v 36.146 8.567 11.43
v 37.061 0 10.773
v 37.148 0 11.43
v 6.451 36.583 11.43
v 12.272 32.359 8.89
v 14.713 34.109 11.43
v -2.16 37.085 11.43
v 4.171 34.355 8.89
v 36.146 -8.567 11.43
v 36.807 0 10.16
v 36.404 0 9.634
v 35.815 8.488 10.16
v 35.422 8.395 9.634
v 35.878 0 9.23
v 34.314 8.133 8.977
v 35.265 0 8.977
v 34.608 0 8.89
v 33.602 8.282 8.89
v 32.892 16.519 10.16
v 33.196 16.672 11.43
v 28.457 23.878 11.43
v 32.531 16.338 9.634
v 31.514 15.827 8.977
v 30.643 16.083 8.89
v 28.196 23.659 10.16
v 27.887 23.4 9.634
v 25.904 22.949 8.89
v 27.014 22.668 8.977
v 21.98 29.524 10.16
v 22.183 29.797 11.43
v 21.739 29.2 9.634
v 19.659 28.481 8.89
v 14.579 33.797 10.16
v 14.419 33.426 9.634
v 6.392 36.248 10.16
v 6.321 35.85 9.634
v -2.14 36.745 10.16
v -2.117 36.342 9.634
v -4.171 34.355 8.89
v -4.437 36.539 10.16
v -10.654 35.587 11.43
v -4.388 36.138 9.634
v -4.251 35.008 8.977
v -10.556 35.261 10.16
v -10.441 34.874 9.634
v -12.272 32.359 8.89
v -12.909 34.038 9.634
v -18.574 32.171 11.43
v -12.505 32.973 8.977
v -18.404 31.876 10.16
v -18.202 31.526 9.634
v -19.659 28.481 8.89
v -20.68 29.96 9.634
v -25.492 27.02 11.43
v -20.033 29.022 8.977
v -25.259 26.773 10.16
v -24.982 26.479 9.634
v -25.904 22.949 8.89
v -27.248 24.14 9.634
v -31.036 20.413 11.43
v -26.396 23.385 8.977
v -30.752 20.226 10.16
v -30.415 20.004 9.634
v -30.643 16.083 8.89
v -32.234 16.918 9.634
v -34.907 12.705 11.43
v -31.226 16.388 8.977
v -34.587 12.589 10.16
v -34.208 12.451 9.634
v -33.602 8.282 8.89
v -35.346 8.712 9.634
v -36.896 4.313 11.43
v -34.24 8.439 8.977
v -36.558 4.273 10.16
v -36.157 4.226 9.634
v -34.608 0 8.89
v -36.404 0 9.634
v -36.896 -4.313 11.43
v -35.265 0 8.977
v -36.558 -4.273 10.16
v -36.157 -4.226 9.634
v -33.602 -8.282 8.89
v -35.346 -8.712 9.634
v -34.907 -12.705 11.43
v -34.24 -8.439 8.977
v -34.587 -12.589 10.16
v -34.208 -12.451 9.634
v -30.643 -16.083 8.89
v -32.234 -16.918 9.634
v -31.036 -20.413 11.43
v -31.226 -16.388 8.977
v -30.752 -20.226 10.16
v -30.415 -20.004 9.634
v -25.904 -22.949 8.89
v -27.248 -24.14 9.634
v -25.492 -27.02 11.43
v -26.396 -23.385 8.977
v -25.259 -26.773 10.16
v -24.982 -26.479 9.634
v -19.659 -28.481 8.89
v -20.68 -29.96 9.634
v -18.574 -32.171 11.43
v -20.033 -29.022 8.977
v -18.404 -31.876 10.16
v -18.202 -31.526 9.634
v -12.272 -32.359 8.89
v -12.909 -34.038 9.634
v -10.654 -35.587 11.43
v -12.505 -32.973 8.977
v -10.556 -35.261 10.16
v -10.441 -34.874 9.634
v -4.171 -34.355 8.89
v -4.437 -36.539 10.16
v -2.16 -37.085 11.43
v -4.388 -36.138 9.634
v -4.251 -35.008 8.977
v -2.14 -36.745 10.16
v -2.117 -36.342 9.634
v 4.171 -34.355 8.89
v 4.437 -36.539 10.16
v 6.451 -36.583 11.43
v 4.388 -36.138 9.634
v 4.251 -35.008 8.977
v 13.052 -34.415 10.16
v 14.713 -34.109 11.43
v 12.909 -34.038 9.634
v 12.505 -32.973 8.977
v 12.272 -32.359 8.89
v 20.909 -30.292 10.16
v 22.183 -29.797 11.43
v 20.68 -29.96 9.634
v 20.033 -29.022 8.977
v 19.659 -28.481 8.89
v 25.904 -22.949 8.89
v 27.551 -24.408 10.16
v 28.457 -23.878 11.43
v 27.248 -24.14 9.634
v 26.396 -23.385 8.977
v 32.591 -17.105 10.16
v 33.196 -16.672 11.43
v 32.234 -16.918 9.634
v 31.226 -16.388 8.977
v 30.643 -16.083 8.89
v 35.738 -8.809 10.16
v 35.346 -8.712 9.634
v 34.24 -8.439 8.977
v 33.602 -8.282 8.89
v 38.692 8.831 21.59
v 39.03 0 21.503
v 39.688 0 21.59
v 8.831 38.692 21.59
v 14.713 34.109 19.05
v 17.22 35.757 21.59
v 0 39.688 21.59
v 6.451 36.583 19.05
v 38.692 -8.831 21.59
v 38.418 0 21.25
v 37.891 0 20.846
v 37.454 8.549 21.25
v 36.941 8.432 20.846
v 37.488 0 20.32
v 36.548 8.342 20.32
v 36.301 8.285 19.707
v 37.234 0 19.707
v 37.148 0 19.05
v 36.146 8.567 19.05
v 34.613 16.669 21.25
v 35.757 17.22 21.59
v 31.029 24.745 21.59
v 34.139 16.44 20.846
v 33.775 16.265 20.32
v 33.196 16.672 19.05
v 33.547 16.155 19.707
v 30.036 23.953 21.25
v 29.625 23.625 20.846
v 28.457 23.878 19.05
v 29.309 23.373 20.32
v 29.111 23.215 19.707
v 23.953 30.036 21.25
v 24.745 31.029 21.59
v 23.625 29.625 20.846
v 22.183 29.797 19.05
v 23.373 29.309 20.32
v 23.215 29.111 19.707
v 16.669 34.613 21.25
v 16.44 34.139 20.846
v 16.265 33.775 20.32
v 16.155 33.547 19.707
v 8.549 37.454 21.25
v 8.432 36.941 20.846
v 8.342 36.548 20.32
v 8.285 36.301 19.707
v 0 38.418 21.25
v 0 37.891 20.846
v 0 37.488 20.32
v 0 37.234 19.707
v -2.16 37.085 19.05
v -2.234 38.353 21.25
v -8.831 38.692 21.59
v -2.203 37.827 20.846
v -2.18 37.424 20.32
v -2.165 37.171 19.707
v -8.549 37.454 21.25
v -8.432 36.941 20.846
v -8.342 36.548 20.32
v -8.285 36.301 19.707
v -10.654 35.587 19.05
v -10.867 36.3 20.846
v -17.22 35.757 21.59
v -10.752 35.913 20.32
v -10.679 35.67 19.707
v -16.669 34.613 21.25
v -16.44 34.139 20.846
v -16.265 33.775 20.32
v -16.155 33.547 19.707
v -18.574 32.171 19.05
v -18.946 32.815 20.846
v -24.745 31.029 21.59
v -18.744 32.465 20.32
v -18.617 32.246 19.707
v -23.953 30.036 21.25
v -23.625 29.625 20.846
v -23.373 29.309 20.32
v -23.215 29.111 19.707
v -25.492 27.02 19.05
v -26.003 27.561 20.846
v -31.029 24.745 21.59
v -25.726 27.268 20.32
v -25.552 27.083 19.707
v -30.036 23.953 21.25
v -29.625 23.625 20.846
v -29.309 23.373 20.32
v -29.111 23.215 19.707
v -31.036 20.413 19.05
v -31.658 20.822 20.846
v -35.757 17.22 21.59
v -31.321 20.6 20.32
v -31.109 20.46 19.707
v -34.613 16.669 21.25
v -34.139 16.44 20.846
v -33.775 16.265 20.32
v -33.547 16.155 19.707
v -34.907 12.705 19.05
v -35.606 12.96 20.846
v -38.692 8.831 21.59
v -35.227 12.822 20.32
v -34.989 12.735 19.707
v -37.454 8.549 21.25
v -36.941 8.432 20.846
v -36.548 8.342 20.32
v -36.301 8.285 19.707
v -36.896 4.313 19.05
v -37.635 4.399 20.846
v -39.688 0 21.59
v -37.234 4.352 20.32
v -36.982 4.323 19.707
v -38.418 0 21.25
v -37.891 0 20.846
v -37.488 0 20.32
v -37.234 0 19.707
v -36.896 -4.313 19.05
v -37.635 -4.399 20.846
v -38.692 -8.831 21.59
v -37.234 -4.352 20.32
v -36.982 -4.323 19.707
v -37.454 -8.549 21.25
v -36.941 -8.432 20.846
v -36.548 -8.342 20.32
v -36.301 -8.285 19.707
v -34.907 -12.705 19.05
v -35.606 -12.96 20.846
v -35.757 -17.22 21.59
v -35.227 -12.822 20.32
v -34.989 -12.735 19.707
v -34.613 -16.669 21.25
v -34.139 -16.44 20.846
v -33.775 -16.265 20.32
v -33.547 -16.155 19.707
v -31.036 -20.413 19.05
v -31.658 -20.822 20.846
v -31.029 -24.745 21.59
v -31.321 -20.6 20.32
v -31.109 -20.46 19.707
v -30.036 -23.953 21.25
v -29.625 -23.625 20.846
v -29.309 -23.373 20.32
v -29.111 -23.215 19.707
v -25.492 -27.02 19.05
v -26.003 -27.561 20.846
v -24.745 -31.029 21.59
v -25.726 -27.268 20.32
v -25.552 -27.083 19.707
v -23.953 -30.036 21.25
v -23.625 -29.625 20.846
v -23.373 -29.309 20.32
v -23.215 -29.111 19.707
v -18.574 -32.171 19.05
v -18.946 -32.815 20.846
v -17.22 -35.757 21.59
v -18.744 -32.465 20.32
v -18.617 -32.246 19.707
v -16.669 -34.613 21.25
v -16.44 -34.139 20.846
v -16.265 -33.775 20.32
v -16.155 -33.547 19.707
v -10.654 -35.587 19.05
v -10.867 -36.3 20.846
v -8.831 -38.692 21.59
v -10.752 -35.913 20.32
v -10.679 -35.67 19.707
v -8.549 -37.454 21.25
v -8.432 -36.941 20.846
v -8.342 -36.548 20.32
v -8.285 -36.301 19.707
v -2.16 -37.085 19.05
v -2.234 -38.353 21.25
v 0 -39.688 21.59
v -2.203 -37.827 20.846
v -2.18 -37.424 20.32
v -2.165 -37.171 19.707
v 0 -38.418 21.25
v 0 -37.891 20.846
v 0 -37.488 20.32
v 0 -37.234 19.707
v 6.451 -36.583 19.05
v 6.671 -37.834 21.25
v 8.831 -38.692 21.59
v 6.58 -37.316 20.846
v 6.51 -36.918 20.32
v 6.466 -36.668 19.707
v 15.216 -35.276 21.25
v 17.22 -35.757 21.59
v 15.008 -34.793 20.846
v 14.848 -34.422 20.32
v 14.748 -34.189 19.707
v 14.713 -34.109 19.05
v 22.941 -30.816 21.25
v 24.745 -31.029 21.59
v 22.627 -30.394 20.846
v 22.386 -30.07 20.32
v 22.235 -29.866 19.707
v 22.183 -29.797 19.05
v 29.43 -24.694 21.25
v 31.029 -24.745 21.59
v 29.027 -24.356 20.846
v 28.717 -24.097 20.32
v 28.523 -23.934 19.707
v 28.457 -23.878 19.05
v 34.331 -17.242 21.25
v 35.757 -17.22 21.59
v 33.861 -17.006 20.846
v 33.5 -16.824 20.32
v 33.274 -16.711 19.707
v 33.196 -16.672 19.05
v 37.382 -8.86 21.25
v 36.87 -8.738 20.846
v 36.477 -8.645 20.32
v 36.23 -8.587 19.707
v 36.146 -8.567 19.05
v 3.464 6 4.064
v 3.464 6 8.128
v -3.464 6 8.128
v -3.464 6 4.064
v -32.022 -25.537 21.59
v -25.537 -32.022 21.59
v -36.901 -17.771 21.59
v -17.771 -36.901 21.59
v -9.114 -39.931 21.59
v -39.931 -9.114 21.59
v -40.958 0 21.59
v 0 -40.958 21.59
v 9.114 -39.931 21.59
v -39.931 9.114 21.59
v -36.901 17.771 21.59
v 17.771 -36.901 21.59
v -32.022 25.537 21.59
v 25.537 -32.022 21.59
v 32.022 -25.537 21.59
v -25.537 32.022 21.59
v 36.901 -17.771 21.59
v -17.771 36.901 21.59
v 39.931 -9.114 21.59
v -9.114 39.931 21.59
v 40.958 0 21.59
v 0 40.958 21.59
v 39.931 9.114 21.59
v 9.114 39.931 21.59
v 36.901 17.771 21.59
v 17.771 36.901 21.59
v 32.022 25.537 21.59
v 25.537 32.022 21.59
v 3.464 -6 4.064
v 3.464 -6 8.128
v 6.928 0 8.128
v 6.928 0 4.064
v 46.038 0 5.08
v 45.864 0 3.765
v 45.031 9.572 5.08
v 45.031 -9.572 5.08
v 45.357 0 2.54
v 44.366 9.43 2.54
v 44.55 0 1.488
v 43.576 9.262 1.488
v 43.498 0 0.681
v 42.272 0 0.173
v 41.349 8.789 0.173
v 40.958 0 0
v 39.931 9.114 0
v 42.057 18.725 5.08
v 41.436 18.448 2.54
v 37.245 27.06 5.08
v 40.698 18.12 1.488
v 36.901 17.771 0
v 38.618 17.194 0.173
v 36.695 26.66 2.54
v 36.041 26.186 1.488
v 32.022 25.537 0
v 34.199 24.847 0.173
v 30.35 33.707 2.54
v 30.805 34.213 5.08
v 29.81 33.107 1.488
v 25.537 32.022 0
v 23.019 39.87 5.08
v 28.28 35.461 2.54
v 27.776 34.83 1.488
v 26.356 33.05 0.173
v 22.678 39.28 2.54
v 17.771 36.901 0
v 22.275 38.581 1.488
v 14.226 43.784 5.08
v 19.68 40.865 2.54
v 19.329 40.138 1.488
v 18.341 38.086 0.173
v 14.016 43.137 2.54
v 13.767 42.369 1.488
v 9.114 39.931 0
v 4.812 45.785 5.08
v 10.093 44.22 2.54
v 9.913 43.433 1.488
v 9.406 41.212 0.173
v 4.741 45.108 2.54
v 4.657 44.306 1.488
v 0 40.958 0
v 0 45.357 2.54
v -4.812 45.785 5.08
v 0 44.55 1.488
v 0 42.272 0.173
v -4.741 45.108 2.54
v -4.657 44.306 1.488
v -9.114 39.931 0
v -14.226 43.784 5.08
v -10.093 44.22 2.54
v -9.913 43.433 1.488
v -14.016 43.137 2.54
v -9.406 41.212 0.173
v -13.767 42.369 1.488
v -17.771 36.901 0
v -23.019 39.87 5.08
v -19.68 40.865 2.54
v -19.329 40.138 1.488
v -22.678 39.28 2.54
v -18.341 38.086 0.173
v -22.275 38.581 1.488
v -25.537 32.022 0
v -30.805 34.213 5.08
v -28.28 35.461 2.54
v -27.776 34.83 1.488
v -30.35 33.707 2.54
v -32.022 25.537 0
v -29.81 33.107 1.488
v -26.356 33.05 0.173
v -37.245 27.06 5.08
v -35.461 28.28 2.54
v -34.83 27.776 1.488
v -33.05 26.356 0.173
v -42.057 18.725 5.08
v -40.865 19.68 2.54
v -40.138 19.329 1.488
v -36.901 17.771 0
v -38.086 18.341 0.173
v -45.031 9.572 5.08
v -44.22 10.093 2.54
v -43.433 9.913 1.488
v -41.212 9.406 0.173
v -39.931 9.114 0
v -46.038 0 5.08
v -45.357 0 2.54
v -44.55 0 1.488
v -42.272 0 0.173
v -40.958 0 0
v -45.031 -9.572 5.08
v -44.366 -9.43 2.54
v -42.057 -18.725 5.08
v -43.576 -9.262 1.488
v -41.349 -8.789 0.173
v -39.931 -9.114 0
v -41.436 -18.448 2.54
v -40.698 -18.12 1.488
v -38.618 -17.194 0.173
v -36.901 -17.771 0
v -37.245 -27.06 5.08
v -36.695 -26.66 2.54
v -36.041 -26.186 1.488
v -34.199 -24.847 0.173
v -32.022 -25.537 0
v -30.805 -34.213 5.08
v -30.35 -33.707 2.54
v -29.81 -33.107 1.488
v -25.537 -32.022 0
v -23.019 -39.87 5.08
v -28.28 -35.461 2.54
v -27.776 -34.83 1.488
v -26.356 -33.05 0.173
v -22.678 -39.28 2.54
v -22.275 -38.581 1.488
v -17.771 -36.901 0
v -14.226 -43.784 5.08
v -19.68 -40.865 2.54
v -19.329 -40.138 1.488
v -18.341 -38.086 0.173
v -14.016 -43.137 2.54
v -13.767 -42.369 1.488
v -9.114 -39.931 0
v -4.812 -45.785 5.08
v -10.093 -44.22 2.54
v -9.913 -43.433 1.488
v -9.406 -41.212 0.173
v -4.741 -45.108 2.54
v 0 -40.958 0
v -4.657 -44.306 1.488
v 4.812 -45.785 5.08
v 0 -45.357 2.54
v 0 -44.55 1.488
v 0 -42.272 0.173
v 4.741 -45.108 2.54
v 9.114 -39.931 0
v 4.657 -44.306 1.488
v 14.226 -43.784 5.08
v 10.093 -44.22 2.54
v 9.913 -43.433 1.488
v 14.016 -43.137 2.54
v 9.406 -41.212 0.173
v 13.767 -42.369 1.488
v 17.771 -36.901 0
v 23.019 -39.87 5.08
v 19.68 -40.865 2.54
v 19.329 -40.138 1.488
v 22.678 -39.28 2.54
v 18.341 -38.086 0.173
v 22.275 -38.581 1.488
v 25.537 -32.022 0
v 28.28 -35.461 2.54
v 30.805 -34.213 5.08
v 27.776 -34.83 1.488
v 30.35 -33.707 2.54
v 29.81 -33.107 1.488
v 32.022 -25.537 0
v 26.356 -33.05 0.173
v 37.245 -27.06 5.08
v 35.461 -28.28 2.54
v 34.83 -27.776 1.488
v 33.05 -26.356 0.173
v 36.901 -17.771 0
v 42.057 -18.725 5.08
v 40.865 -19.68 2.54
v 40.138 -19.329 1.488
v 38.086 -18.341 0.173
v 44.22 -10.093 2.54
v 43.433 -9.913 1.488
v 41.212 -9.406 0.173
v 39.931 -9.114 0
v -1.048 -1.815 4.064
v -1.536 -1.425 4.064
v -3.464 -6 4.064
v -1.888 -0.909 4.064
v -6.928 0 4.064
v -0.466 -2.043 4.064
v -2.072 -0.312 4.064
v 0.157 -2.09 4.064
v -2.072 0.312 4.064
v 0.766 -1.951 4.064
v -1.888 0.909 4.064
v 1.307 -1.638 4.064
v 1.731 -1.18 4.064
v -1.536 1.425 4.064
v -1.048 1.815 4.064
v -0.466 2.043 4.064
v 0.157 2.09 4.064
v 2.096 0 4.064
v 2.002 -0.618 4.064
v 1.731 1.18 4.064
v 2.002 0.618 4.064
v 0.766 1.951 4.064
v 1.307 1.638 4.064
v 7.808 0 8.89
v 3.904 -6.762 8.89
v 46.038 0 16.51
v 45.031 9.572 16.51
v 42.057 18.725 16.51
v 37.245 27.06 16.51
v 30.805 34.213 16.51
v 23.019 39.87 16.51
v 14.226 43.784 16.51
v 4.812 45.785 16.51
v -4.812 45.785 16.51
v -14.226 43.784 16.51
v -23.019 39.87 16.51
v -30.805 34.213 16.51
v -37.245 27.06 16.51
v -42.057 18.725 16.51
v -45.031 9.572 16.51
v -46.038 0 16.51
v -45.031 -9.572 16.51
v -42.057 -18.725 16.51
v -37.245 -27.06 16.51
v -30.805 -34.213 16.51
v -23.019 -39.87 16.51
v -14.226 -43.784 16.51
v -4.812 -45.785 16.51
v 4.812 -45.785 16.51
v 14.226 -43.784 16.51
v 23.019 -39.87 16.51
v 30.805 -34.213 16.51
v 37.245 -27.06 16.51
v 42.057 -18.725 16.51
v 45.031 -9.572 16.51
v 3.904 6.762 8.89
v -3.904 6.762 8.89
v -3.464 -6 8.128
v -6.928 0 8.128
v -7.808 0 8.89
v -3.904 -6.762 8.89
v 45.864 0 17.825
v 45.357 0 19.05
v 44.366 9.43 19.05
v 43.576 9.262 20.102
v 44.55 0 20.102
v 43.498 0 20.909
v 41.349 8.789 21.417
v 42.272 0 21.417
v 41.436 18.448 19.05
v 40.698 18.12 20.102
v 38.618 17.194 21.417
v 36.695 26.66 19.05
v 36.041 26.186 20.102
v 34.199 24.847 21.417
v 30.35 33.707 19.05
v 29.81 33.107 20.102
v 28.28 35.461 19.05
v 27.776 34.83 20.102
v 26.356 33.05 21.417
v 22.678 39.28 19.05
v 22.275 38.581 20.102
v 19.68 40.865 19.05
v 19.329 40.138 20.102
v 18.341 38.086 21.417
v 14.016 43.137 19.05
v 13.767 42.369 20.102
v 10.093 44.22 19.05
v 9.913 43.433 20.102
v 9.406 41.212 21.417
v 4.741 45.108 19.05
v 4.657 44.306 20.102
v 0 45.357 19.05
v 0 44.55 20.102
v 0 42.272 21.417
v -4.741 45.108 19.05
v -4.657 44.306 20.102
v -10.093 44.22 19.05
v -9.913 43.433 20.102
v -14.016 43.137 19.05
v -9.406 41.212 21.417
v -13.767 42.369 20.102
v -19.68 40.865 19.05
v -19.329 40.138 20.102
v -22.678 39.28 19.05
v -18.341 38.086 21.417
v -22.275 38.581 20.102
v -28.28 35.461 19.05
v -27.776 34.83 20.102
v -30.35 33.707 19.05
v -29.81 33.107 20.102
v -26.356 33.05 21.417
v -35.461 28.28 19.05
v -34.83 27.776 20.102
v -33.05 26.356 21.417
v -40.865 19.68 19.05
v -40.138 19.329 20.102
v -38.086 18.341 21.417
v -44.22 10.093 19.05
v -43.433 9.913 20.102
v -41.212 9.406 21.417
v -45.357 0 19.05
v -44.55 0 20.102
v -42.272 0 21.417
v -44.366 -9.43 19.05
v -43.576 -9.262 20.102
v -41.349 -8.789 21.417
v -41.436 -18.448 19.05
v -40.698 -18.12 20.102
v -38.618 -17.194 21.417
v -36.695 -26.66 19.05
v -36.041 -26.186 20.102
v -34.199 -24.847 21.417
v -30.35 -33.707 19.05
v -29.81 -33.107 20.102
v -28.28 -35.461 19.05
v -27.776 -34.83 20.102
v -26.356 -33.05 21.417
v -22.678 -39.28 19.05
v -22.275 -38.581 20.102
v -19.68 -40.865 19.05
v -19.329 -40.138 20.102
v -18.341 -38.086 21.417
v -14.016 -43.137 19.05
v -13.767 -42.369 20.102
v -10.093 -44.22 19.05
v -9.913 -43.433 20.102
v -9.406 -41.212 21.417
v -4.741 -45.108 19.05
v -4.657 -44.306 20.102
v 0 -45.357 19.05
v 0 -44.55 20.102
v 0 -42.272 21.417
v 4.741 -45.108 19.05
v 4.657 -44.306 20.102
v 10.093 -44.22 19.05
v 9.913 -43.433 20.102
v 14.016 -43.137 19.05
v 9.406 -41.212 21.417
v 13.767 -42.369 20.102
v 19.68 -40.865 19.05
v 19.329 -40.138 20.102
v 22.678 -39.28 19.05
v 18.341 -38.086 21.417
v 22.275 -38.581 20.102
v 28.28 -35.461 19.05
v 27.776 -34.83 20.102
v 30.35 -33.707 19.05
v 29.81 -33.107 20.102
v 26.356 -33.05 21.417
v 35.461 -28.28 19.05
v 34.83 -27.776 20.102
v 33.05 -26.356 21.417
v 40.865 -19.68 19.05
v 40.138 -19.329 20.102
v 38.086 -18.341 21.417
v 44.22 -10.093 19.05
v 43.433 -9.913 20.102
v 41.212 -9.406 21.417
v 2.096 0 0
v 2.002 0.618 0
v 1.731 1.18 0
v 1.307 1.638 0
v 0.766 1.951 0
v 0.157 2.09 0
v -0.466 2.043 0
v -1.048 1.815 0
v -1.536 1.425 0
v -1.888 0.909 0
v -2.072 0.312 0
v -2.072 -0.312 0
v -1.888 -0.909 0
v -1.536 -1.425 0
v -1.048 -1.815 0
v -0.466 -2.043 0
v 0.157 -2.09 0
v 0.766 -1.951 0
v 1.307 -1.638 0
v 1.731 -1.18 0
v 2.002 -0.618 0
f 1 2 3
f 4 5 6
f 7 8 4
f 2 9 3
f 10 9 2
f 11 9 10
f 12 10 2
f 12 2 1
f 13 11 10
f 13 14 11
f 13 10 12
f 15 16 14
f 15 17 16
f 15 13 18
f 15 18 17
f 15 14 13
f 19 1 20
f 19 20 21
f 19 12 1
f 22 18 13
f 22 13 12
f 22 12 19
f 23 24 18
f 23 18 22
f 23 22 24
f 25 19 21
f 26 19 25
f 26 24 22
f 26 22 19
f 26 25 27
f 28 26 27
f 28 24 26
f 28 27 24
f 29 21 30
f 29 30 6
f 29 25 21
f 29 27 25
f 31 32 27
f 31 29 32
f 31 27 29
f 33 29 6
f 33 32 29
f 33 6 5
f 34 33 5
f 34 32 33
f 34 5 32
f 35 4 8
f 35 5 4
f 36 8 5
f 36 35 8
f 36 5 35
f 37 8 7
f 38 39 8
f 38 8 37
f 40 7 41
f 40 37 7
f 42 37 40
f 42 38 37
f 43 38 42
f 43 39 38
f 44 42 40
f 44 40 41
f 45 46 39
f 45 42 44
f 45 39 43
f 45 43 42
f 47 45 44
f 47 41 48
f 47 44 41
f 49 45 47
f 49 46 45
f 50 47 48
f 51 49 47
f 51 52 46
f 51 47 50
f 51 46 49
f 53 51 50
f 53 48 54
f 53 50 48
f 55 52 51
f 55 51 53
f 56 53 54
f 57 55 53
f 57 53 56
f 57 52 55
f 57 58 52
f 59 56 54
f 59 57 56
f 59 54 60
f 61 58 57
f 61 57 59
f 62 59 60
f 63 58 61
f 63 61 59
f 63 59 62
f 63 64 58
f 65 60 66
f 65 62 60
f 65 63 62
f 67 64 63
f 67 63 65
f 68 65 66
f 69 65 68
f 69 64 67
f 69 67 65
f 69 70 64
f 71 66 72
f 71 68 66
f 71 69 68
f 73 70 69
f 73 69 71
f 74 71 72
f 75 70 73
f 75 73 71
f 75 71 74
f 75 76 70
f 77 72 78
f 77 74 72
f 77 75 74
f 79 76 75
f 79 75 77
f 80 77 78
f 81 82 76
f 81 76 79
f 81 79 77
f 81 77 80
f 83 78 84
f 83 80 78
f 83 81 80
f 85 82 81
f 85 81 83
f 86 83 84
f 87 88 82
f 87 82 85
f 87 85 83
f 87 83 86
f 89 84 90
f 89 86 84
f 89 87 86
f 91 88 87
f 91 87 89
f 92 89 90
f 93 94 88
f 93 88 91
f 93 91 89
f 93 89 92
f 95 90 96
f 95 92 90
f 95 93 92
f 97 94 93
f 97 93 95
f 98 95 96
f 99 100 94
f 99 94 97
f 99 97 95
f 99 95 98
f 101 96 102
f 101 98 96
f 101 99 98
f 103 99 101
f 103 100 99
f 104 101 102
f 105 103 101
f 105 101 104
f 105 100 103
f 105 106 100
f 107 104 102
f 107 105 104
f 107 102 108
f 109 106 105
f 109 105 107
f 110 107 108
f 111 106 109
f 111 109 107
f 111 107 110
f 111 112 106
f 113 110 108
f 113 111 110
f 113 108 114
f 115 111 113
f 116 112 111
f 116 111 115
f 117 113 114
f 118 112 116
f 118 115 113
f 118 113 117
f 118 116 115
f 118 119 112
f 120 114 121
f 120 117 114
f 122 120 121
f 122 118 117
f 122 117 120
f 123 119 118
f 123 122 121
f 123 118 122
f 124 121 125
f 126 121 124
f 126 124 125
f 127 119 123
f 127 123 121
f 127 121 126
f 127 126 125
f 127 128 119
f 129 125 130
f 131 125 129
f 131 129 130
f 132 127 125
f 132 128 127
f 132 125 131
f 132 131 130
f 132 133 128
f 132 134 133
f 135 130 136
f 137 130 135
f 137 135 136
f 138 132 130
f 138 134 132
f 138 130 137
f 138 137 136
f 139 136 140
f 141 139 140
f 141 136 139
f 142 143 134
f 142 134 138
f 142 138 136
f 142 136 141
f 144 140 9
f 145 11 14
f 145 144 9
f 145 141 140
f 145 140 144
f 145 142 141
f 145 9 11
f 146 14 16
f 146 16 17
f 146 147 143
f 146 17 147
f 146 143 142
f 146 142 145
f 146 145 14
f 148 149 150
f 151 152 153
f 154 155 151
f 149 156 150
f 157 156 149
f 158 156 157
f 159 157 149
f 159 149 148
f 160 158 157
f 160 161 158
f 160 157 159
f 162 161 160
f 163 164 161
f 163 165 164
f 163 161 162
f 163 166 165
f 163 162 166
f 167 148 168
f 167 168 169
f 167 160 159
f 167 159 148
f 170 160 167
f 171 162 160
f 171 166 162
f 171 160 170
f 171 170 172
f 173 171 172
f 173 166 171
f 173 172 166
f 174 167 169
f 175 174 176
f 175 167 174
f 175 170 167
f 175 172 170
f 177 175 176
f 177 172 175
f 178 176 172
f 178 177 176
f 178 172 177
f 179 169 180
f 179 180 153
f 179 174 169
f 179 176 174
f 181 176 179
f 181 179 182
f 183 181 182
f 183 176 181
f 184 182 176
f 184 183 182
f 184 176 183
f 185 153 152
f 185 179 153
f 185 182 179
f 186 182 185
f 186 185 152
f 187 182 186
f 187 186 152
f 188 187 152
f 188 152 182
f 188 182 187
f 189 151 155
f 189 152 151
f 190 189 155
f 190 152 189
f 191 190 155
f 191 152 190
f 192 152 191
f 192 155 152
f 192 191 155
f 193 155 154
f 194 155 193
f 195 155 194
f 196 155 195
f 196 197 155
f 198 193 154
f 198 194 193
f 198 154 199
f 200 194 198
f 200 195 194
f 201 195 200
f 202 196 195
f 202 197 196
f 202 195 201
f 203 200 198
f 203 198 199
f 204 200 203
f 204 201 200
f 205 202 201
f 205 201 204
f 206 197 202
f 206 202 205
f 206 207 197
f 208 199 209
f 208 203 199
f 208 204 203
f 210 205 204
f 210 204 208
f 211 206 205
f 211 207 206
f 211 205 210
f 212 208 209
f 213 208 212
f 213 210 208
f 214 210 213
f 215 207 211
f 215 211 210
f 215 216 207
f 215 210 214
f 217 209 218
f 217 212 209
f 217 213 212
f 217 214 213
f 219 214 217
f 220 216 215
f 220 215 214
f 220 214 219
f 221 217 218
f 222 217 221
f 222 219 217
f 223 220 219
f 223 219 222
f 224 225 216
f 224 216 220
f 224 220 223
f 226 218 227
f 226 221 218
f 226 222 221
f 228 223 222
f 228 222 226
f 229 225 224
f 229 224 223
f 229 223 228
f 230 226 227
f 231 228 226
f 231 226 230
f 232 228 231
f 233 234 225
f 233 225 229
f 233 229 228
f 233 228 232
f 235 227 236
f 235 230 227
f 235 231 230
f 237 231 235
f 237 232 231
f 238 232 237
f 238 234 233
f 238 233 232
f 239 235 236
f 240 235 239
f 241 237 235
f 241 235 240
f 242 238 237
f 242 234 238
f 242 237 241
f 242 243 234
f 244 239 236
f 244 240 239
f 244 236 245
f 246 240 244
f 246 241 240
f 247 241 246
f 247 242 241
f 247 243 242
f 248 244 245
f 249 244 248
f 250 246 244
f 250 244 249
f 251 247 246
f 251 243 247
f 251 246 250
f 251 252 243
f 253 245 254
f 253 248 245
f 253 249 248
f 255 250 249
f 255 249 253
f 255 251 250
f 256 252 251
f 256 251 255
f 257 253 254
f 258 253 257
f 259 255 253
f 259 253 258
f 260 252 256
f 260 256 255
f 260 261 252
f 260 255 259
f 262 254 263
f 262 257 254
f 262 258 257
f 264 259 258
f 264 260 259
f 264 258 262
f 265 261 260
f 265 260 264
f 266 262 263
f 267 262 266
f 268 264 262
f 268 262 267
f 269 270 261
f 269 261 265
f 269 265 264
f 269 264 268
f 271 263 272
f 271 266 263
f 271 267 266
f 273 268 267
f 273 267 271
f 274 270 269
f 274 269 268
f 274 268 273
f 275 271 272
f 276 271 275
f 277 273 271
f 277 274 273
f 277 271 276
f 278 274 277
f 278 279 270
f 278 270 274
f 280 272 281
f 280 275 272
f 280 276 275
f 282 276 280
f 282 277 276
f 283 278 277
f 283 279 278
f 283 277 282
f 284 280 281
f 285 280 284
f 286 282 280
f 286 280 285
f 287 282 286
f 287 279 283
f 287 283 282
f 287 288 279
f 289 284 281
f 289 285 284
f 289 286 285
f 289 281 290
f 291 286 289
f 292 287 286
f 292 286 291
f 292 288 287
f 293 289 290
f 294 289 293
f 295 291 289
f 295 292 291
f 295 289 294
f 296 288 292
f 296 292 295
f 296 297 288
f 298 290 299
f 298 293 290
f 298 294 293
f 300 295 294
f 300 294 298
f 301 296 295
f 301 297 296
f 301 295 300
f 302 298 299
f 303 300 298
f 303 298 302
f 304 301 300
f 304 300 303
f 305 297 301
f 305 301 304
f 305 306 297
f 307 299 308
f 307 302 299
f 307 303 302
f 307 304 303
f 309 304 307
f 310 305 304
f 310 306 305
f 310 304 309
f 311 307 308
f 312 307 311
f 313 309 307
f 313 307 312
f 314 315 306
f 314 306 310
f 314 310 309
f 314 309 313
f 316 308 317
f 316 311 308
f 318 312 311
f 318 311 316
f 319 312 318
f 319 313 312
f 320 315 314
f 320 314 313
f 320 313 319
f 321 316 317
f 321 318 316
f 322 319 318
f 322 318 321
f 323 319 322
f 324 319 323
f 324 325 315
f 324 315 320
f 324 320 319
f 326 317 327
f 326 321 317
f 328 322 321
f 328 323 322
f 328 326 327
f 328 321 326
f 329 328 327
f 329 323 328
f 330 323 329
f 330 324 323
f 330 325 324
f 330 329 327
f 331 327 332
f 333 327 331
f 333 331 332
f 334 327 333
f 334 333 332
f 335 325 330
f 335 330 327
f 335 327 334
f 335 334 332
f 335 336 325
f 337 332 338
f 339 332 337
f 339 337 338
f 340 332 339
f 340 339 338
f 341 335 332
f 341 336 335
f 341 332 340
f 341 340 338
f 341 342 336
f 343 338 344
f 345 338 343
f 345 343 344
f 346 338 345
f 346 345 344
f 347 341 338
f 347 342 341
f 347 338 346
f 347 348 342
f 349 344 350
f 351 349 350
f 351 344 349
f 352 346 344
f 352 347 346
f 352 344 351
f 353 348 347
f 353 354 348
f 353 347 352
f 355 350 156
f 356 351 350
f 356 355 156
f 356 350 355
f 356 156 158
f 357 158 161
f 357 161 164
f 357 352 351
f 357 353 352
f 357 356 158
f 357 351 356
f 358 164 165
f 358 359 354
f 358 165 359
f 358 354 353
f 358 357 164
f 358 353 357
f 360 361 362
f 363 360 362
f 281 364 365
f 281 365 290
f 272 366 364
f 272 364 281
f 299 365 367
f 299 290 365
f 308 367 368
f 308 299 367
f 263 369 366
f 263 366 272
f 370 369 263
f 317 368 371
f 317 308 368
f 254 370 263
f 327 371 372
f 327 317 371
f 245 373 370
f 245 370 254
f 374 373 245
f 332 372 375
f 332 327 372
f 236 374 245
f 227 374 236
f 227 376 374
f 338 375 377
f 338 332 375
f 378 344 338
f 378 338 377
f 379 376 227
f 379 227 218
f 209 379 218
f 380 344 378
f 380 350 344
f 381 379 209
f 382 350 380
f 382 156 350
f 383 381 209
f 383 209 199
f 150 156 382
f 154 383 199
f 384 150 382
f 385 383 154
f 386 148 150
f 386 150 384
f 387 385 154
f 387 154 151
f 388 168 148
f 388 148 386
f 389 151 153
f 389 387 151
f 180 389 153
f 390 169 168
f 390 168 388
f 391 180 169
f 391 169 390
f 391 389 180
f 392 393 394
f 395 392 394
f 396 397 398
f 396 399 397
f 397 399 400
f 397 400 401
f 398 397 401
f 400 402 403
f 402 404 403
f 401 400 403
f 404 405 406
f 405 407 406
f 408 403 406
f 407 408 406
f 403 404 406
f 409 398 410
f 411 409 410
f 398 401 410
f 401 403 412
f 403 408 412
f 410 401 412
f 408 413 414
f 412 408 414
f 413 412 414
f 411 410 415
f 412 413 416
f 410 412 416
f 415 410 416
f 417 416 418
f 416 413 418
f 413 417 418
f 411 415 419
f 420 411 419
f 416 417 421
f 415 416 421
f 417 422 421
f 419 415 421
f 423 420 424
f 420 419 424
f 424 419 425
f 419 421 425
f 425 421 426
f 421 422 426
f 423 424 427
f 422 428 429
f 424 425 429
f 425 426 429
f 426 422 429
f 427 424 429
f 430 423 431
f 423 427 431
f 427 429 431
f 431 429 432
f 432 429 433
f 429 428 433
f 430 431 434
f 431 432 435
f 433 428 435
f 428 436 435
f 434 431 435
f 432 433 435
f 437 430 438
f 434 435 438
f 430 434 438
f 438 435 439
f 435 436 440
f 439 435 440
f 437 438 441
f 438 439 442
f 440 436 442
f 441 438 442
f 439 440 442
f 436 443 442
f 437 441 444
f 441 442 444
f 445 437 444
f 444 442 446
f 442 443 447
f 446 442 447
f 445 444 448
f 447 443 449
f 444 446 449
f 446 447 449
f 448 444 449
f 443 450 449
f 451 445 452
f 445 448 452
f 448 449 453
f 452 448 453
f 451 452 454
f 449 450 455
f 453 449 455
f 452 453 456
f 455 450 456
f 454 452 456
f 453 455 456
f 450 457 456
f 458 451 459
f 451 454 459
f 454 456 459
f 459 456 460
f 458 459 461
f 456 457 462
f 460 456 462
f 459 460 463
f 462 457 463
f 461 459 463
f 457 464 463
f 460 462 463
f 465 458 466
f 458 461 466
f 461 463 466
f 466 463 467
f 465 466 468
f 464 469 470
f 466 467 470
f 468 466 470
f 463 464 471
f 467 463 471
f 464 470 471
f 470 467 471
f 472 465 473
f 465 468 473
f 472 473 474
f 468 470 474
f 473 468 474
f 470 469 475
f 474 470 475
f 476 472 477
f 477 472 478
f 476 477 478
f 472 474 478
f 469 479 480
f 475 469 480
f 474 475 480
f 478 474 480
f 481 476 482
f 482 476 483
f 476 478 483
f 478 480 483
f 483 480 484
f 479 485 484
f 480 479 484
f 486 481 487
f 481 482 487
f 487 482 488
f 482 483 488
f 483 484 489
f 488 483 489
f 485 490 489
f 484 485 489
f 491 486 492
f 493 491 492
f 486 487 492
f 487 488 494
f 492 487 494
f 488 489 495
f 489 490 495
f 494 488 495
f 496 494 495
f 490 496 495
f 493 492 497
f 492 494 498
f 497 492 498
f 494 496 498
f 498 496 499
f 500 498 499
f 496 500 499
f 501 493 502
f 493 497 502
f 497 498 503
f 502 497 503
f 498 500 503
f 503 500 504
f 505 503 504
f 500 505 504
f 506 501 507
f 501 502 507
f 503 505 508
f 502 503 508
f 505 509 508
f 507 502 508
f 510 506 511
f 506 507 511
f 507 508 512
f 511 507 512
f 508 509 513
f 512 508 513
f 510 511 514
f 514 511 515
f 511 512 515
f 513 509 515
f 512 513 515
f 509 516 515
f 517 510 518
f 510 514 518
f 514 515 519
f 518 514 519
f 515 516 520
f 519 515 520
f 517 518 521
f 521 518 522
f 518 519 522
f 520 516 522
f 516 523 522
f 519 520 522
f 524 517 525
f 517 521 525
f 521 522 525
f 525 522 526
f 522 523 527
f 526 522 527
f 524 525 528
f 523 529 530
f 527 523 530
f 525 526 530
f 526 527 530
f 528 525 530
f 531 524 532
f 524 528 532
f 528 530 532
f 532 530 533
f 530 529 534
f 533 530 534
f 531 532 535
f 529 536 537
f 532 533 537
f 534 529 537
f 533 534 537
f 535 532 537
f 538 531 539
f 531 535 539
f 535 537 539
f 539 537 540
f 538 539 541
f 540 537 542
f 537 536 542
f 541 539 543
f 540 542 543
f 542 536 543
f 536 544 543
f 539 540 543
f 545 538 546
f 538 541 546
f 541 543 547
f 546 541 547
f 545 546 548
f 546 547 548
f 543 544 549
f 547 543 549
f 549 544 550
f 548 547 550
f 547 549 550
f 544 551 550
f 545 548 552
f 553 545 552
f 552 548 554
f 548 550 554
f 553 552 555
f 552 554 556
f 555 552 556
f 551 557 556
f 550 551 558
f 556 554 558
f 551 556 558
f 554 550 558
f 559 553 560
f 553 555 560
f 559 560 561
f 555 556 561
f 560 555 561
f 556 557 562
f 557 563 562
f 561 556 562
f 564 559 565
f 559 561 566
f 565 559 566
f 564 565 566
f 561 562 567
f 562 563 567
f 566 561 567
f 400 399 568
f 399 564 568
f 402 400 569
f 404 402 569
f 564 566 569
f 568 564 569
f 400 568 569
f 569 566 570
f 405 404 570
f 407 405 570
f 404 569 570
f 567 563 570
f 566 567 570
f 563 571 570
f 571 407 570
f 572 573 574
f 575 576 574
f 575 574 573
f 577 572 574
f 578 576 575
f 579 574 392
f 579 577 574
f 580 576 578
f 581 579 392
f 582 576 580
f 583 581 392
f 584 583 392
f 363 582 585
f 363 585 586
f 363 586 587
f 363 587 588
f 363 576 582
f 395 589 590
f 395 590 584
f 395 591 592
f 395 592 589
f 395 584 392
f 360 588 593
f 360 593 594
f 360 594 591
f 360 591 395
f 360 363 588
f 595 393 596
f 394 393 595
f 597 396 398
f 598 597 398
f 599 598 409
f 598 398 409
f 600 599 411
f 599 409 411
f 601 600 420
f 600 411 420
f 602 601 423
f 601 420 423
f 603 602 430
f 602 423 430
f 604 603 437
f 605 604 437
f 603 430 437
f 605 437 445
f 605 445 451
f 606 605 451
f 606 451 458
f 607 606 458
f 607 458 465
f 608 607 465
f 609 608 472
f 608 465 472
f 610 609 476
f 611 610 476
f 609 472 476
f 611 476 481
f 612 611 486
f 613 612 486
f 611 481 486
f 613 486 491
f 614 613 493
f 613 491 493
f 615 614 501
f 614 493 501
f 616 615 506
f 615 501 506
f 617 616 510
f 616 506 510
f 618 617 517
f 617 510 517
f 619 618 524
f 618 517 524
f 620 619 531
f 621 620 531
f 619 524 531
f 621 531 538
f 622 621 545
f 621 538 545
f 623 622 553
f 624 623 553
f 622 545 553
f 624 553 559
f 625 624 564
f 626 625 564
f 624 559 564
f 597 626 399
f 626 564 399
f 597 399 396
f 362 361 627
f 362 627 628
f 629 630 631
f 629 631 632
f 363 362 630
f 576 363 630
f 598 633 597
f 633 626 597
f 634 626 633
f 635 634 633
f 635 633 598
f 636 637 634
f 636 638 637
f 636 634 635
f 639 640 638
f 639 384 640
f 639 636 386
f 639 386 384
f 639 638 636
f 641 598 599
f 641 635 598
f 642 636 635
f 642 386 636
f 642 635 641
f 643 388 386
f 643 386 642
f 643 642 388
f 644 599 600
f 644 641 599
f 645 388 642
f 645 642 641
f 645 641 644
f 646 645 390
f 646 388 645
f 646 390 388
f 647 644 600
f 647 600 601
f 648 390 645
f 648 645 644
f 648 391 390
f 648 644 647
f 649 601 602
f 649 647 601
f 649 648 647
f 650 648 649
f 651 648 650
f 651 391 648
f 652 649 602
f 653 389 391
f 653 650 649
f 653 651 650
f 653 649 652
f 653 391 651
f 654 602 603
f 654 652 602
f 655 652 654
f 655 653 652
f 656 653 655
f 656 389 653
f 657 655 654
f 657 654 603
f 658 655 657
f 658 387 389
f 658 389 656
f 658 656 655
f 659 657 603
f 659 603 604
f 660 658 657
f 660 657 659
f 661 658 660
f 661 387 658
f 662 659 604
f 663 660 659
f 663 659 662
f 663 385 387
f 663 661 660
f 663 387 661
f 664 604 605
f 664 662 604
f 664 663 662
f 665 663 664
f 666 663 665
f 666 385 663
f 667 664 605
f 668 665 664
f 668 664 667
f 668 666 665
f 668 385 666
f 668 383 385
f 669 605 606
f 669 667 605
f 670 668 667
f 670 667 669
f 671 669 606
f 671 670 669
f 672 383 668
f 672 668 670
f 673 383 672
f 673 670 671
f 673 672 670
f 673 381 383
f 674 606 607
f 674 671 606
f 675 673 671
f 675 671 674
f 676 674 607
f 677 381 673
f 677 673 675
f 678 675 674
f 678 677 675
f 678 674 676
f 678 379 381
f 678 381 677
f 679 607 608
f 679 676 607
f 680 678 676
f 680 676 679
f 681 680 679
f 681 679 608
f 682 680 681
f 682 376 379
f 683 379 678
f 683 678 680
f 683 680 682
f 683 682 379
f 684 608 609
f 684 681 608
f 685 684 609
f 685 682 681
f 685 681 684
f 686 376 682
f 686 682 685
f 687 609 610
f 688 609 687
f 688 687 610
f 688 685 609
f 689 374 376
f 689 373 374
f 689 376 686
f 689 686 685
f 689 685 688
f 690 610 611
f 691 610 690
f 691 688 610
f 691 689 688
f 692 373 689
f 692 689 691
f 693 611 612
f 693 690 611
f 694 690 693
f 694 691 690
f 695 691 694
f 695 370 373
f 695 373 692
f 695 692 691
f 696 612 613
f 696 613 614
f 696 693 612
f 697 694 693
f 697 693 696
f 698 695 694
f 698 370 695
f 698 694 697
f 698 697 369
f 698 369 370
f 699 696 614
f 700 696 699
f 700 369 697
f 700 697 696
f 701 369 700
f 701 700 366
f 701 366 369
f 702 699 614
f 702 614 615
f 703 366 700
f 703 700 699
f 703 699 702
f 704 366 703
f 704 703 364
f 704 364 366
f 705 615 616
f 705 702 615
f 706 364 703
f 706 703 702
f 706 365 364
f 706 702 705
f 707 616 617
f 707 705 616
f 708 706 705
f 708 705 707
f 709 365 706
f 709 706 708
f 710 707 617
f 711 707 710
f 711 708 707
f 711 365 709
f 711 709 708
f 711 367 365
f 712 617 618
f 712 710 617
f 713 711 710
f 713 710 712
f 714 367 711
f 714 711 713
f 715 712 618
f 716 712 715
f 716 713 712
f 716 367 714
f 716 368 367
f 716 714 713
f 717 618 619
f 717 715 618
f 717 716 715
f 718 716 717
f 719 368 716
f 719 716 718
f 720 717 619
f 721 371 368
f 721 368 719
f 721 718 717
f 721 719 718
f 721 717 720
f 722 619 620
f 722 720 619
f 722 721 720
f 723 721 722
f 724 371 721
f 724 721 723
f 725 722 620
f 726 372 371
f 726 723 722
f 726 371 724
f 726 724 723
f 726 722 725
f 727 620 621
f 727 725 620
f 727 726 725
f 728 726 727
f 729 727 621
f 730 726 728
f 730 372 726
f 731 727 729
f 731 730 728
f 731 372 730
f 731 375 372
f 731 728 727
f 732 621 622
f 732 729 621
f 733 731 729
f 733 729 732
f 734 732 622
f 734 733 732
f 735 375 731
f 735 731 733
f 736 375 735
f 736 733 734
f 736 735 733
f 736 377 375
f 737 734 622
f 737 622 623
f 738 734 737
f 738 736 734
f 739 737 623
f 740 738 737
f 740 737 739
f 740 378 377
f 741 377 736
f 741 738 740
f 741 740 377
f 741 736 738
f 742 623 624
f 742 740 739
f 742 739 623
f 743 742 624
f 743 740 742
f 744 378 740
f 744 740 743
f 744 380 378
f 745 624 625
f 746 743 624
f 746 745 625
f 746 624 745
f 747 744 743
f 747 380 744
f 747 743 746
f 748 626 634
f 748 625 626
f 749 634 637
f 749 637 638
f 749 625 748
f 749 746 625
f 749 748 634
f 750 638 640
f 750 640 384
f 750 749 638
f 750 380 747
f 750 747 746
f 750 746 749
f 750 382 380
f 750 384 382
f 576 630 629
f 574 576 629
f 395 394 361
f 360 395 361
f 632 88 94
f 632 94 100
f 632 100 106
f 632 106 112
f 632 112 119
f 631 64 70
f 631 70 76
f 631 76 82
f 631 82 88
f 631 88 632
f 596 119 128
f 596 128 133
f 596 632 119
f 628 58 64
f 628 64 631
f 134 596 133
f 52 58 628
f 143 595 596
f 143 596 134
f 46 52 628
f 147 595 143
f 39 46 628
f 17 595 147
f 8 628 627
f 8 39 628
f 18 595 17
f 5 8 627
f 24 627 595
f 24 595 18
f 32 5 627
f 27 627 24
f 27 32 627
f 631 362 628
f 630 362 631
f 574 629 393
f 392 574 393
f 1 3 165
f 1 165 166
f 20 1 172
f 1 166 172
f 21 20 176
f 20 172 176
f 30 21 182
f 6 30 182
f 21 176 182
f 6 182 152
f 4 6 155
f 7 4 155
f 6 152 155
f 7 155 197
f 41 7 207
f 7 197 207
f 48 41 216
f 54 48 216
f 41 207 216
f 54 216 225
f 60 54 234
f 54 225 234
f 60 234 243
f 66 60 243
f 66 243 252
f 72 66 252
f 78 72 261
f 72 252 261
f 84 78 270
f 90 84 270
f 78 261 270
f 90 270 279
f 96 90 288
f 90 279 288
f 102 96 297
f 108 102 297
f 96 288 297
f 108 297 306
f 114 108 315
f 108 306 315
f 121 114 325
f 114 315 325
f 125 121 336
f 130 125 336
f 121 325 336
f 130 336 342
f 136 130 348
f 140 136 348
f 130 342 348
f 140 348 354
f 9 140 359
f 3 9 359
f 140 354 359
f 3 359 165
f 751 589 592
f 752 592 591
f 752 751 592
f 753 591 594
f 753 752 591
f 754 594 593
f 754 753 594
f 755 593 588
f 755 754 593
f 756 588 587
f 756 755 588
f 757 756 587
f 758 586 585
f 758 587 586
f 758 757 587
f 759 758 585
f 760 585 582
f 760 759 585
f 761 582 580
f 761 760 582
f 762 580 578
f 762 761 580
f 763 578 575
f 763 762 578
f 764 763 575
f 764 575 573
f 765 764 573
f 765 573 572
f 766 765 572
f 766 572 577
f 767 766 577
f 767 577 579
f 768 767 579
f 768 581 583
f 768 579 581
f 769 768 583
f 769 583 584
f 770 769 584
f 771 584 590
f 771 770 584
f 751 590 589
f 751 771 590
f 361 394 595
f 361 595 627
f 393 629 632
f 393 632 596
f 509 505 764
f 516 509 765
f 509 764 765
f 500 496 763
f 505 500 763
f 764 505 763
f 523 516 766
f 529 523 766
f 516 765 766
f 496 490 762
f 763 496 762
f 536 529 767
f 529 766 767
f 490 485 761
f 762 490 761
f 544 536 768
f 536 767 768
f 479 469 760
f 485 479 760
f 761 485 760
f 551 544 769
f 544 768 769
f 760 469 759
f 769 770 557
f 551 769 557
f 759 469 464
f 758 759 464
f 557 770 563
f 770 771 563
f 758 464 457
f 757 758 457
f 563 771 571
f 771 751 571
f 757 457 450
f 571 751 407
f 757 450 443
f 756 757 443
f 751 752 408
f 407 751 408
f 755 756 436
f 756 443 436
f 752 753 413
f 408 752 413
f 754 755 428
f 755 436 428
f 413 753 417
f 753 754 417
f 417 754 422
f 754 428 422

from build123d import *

# Parameters (mm, degrees)
SKETCH_R        = 46.0375
SKETCH_R_2      = 2.0955
PAD_DEPTH       = 21.59
SKETCH001_R     = 37.1475
POCKET_DEPTH    = 12.7
POCKET001_DEPTH = 4.826
FILLET_R        = 5.08
FILLET001_R     = 2.54
CHAMFER_SIZE    = 0.762


with BuildPart() as part:
    # Sketch → Pad (new body)
    with BuildSketch(Plane.XY):
        Circle(SKETCH_R)
        Circle(SKETCH_R_2, mode=Mode.SUBTRACT)
    extrude(amount=PAD_DEPTH)

    # Sketch001 (on Face4 of Pad) → Pocket (cut)
    with BuildSketch(Plane.XY.offset(21.59)):
        Circle(SKETCH001_R)
    extrude(amount=-POCKET_DEPTH, mode=Mode.SUBTRACT)

    # Sketch002 (on Face6 of Pocket) → Pocket001 (cut)
    with BuildSketch(Plane.XY.offset(8.89)):
        Polygon((6.928203, 0), (3.464102, 6), (-3.464102, 6), (-6.928203, 0), (-3.464102, -6), (3.464102, -6), align=None)
    extrude(amount=-POCKET001_DEPTH, mode=Mode.SUBTRACT)

    # Fillet
    fillet_edges = [part.edges().sort_by_distance(p)[0] for p in [
        (-46.0375, 0, 21.59),
        (-46.0375, 0, 0),
    ]]
    fillet(fillet_edges, radius=FILLET_R)

    # Fillet001
    fillet001_edges = [part.edges().sort_by_distance(p)[0] for p in [
        (-37.1475, 0, 21.59),
        (-37.1475, 0, 8.89),
    ]]
    fillet(fillet001_edges, radius=FILLET001_R)

    # Chamfer
    chamfer_edges = [part.edges().sort_by_distance(p)[0] for p in [
        (-5.196152, 3, 8.89),
        (-5.196152, -3, 8.89),
        (0, -6, 8.89),
        (5.196152, -3, 8.89),
        (5.196152, 3, 8.89),
        (0, 6, 8.89),
    ]]
    chamfer(chamfer_edges, length=CHAMFER_SIZE)


solid = part.part
